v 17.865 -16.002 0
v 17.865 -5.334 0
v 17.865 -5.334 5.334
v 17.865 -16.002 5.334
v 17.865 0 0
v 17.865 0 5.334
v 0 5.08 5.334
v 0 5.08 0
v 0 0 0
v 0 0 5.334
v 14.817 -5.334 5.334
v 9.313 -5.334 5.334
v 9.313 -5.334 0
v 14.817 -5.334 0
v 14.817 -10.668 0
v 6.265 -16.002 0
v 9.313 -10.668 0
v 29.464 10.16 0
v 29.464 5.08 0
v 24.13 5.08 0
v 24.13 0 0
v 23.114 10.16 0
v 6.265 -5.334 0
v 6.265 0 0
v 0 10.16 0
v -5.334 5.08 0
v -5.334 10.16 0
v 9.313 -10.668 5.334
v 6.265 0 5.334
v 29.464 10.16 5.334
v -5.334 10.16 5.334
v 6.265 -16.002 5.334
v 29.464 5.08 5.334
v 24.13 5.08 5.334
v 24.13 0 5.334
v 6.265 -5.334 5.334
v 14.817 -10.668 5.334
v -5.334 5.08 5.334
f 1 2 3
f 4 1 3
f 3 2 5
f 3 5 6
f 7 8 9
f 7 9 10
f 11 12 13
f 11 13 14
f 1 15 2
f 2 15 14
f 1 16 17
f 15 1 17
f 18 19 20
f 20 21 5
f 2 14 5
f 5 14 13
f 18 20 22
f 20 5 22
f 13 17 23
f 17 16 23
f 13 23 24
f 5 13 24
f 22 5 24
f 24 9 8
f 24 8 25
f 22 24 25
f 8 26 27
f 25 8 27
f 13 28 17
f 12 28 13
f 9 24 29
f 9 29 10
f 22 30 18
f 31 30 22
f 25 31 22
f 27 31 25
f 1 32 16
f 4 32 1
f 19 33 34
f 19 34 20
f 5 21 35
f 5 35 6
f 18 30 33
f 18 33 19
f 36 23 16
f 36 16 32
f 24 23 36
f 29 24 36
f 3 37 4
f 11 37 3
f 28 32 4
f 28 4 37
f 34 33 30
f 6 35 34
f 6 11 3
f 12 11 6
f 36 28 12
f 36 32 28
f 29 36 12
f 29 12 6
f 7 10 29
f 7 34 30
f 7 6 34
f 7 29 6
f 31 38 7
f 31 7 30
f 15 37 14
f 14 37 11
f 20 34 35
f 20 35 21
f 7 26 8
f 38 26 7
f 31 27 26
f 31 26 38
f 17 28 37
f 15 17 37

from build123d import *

# Parameters (mm, degrees)
SKETCH1_W            = 24.13
SKETCH1_H            = 10.16
BOSS_EXTRUDE1_DEPTH  = 5.334
SKETCH6_W            = 5.334
SKETCH6_H            = 10.16
BOSS_EXTRUDE5_DEPTH  = 5.334
SKETCH11_W           = 5.334
SKETCH11_H           = 10.206206115
BOSS_EXTRUDE6_DEPTH  = 5.334
SKETCH12_W           = 34.798
SKETCH12_H           = 5.334
BOSS_EXTRUDE7_DEPTH  = 5.334
SKETCH13_W           = 5.334
SKETCH13_H           = 0.046206115
CUT_EXTRUDE1_DEPTH   = 32.634561721
SKETCH17_W           = 11.599333333
SKETCH17_H           = 5.334
CUT_EXTRUDE5_DEPTH   = 5.334
SKETCH18_W           = 5.334
SKETCH18_H           = 5.08
SKETCH18_W_2         = 11.684
CUT_EXTRUDE6_DEPTH   = 5.334
SKETCH19_W           = 5.334
SKETCH19_H           = 5.08
BOSS_EXTRUDE8_DEPTH  = 5.334
SKETCH20_W           = 5.334
SKETCH20_H           = 5.08
BOSS_EXTRUDE10_DEPTH = 1.016
SKETCH21_W           = 11.599333334
SKETCH21_H           = 5.334
BOSS_EXTRUDE11_DEPTH = 10.668
SKETCH22_W           = 5.503333334
SKETCH22_H           = 5.334
CUT_EXTRUDE7_DEPTH   = 34.950594339
SKETCH23_W           = 5.334
SKETCH23_H           = 5.08
BOSS_EXTRUDE12_DEPTH = 5.334
SKETCH24_W           = 5.334
SKETCH24_H           = 5.08
CUT_EXTRUDE8_DEPTH   = 5.334
SKETCH25_W           = 5.334
SKETCH25_H           = 5.08
BOSS_EXTRUDE13_DEPTH = 5.334
SKETCH26_W           = 5.334
SKETCH26_H           = 5.08
CUT_EXTRUDE9_DEPTH   = 5.334


with BuildPart() as part:
    # Sketch1 → Boss-Extrude1 (new body)
    with BuildSketch(Plane.XY):
        with Locations((12.065, 5.08)):
            Rectangle(SKETCH1_W, SKETCH1_H)
    extrude(amount=BOSS_EXTRUDE1_DEPTH)

    # Sketch6 → Boss-Extrude5 (add)
    with BuildSketch(Plane(origin=(24.13, 0, 0), x_dir=(0, 0, -1), z_dir=(1, 0, 0))):
        with Locations((-2.667, 5.08)):
            Rectangle(SKETCH6_W, SKETCH6_H)
    extrude(amount=BOSS_EXTRUDE5_DEPTH)

    # Sketch11 → Boss-Extrude6 (add)
    with BuildSketch(Plane.ZY):
        with Locations((2.667, 5.103103058)):
            Rectangle(SKETCH11_W, SKETCH11_H)
    extrude(amount=BOSS_EXTRUDE6_DEPTH)

    # Sketch12 → Boss-Extrude7 (add)
    with BuildSketch(Plane(origin=(0, 0, 0), x_dir=(-1, 0, 0), z_dir=(0, -1, 0))):
        with Locations((-12.065, -2.667)):
            Rectangle(SKETCH12_W, SKETCH12_H)
    extrude(amount=BOSS_EXTRUDE7_DEPTH)

    # Sketch13 → Cut-Extrude1 (cut, through all)
    with BuildSketch(Plane(origin=(0, 0, 0), x_dir=(-1, 0, 0), z_dir=(0, 0, -1))):
        with Locations((2.667, 10.183103058)):
            Rectangle(SKETCH13_W, SKETCH13_H)
    extrude(amount=-CUT_EXTRUDE1_DEPTH, mode=Mode.SUBTRACT)

    # Sketch17 → Cut-Extrude5 (cut)
    with BuildSketch(Plane(origin=(0, -5.334, 0), x_dir=(-1, 0, 0), z_dir=(0, -1, 0))):
        with Locations((-0.465666666, -2.667)):
            Rectangle(SKETCH17_W, SKETCH17_H)
        with Locations((-23.664333334, -2.667)):
            Rectangle(SKETCH17_W, SKETCH17_H)
    extrude(amount=-CUT_EXTRUDE5_DEPTH, mode=Mode.SUBTRACT)

    # Sketch18 → Cut-Extrude6 (cut)
    with BuildSketch(Plane.XY.offset(5.334)):
        with Locations((-2.667, 7.62)):
            Rectangle(SKETCH18_W, SKETCH18_H)
        with Locations((23.622, 7.62)):
            Rectangle(SKETCH18_W_2, SKETCH18_H)
    extrude(amount=-CUT_EXTRUDE6_DEPTH, mode=Mode.SUBTRACT)

    # Sketch19 → Boss-Extrude8 (add)
    with BuildSketch(Plane(origin=(17.78, 0, 0), x_dir=(0, 0, -1), z_dir=(1, 0, 0))):
        with Locations((-2.667, 7.62)):
            Rectangle(SKETCH19_W, SKETCH19_H)
    extrude(amount=BOSS_EXTRUDE8_DEPTH)

    # Sketch20 → Boss-Extrude10 (add)
    with BuildSketch(Plane(origin=(23.114, 0, 0), x_dir=(0, 0, -1), z_dir=(1, 0, 0))):
        with Locations((-2.667, 7.62)):
            Rectangle(SKETCH20_W, SKETCH20_H)
    extrude(amount=BOSS_EXTRUDE10_DEPTH)

    # Sketch21 → Boss-Extrude11 (add)
    with BuildSketch(Plane.XZ.offset(5.334)):
        with Locations((12.065, 2.667)):
            Rectangle(SKETCH21_W, SKETCH21_H)
    extrude(amount=BOSS_EXTRUDE11_DEPTH)

    # Sketch22 → Cut-Extrude7 (cut, through all)
    with BuildSketch(Plane.XY.offset(5.334)):
        with Locations((12.065, -8.001)):
            Rectangle(SKETCH22_W, SKETCH22_H)
    extrude(amount=-CUT_EXTRUDE7_DEPTH, mode=Mode.SUBTRACT)

    # Sketch23 → Boss-Extrude12 (add)
    with BuildSketch(Plane.ZY):
        with Locations((2.667, 7.62)):
            Rectangle(SKETCH23_W, SKETCH23_H)
    extrude(amount=BOSS_EXTRUDE12_DEPTH)

    # Sketch24 → Cut-Extrude8 (cut)
    with BuildSketch(Plane.ZY.offset(5.334)):
        with Locations((2.667, 2.54)):
            Rectangle(SKETCH24_W, SKETCH24_H)
    extrude(amount=-CUT_EXTRUDE8_DEPTH, mode=Mode.SUBTRACT)

    # Sketch25 → Boss-Extrude13 (add)
    with BuildSketch(Plane(origin=(24.13, 0, 0), x_dir=(0, 0, -1), z_dir=(1, 0, 0))):
        with Locations((-2.667, 7.62)):
            Rectangle(SKETCH25_W, SKETCH25_H)
    extrude(amount=BOSS_EXTRUDE13_DEPTH)

    # Sketch26 → Cut-Extrude9 (cut)
    with BuildSketch(Plane(origin=(29.464, 0, 0), x_dir=(0, 0, -1), z_dir=(1, 0, 0))):
        with Locations((-2.667, 2.54)):
            Rectangle(SKETCH26_W, SKETCH26_H)
    extrude(amount=-CUT_EXTRUDE9_DEPTH, mode=Mode.SUBTRACT)


solid = part.part
